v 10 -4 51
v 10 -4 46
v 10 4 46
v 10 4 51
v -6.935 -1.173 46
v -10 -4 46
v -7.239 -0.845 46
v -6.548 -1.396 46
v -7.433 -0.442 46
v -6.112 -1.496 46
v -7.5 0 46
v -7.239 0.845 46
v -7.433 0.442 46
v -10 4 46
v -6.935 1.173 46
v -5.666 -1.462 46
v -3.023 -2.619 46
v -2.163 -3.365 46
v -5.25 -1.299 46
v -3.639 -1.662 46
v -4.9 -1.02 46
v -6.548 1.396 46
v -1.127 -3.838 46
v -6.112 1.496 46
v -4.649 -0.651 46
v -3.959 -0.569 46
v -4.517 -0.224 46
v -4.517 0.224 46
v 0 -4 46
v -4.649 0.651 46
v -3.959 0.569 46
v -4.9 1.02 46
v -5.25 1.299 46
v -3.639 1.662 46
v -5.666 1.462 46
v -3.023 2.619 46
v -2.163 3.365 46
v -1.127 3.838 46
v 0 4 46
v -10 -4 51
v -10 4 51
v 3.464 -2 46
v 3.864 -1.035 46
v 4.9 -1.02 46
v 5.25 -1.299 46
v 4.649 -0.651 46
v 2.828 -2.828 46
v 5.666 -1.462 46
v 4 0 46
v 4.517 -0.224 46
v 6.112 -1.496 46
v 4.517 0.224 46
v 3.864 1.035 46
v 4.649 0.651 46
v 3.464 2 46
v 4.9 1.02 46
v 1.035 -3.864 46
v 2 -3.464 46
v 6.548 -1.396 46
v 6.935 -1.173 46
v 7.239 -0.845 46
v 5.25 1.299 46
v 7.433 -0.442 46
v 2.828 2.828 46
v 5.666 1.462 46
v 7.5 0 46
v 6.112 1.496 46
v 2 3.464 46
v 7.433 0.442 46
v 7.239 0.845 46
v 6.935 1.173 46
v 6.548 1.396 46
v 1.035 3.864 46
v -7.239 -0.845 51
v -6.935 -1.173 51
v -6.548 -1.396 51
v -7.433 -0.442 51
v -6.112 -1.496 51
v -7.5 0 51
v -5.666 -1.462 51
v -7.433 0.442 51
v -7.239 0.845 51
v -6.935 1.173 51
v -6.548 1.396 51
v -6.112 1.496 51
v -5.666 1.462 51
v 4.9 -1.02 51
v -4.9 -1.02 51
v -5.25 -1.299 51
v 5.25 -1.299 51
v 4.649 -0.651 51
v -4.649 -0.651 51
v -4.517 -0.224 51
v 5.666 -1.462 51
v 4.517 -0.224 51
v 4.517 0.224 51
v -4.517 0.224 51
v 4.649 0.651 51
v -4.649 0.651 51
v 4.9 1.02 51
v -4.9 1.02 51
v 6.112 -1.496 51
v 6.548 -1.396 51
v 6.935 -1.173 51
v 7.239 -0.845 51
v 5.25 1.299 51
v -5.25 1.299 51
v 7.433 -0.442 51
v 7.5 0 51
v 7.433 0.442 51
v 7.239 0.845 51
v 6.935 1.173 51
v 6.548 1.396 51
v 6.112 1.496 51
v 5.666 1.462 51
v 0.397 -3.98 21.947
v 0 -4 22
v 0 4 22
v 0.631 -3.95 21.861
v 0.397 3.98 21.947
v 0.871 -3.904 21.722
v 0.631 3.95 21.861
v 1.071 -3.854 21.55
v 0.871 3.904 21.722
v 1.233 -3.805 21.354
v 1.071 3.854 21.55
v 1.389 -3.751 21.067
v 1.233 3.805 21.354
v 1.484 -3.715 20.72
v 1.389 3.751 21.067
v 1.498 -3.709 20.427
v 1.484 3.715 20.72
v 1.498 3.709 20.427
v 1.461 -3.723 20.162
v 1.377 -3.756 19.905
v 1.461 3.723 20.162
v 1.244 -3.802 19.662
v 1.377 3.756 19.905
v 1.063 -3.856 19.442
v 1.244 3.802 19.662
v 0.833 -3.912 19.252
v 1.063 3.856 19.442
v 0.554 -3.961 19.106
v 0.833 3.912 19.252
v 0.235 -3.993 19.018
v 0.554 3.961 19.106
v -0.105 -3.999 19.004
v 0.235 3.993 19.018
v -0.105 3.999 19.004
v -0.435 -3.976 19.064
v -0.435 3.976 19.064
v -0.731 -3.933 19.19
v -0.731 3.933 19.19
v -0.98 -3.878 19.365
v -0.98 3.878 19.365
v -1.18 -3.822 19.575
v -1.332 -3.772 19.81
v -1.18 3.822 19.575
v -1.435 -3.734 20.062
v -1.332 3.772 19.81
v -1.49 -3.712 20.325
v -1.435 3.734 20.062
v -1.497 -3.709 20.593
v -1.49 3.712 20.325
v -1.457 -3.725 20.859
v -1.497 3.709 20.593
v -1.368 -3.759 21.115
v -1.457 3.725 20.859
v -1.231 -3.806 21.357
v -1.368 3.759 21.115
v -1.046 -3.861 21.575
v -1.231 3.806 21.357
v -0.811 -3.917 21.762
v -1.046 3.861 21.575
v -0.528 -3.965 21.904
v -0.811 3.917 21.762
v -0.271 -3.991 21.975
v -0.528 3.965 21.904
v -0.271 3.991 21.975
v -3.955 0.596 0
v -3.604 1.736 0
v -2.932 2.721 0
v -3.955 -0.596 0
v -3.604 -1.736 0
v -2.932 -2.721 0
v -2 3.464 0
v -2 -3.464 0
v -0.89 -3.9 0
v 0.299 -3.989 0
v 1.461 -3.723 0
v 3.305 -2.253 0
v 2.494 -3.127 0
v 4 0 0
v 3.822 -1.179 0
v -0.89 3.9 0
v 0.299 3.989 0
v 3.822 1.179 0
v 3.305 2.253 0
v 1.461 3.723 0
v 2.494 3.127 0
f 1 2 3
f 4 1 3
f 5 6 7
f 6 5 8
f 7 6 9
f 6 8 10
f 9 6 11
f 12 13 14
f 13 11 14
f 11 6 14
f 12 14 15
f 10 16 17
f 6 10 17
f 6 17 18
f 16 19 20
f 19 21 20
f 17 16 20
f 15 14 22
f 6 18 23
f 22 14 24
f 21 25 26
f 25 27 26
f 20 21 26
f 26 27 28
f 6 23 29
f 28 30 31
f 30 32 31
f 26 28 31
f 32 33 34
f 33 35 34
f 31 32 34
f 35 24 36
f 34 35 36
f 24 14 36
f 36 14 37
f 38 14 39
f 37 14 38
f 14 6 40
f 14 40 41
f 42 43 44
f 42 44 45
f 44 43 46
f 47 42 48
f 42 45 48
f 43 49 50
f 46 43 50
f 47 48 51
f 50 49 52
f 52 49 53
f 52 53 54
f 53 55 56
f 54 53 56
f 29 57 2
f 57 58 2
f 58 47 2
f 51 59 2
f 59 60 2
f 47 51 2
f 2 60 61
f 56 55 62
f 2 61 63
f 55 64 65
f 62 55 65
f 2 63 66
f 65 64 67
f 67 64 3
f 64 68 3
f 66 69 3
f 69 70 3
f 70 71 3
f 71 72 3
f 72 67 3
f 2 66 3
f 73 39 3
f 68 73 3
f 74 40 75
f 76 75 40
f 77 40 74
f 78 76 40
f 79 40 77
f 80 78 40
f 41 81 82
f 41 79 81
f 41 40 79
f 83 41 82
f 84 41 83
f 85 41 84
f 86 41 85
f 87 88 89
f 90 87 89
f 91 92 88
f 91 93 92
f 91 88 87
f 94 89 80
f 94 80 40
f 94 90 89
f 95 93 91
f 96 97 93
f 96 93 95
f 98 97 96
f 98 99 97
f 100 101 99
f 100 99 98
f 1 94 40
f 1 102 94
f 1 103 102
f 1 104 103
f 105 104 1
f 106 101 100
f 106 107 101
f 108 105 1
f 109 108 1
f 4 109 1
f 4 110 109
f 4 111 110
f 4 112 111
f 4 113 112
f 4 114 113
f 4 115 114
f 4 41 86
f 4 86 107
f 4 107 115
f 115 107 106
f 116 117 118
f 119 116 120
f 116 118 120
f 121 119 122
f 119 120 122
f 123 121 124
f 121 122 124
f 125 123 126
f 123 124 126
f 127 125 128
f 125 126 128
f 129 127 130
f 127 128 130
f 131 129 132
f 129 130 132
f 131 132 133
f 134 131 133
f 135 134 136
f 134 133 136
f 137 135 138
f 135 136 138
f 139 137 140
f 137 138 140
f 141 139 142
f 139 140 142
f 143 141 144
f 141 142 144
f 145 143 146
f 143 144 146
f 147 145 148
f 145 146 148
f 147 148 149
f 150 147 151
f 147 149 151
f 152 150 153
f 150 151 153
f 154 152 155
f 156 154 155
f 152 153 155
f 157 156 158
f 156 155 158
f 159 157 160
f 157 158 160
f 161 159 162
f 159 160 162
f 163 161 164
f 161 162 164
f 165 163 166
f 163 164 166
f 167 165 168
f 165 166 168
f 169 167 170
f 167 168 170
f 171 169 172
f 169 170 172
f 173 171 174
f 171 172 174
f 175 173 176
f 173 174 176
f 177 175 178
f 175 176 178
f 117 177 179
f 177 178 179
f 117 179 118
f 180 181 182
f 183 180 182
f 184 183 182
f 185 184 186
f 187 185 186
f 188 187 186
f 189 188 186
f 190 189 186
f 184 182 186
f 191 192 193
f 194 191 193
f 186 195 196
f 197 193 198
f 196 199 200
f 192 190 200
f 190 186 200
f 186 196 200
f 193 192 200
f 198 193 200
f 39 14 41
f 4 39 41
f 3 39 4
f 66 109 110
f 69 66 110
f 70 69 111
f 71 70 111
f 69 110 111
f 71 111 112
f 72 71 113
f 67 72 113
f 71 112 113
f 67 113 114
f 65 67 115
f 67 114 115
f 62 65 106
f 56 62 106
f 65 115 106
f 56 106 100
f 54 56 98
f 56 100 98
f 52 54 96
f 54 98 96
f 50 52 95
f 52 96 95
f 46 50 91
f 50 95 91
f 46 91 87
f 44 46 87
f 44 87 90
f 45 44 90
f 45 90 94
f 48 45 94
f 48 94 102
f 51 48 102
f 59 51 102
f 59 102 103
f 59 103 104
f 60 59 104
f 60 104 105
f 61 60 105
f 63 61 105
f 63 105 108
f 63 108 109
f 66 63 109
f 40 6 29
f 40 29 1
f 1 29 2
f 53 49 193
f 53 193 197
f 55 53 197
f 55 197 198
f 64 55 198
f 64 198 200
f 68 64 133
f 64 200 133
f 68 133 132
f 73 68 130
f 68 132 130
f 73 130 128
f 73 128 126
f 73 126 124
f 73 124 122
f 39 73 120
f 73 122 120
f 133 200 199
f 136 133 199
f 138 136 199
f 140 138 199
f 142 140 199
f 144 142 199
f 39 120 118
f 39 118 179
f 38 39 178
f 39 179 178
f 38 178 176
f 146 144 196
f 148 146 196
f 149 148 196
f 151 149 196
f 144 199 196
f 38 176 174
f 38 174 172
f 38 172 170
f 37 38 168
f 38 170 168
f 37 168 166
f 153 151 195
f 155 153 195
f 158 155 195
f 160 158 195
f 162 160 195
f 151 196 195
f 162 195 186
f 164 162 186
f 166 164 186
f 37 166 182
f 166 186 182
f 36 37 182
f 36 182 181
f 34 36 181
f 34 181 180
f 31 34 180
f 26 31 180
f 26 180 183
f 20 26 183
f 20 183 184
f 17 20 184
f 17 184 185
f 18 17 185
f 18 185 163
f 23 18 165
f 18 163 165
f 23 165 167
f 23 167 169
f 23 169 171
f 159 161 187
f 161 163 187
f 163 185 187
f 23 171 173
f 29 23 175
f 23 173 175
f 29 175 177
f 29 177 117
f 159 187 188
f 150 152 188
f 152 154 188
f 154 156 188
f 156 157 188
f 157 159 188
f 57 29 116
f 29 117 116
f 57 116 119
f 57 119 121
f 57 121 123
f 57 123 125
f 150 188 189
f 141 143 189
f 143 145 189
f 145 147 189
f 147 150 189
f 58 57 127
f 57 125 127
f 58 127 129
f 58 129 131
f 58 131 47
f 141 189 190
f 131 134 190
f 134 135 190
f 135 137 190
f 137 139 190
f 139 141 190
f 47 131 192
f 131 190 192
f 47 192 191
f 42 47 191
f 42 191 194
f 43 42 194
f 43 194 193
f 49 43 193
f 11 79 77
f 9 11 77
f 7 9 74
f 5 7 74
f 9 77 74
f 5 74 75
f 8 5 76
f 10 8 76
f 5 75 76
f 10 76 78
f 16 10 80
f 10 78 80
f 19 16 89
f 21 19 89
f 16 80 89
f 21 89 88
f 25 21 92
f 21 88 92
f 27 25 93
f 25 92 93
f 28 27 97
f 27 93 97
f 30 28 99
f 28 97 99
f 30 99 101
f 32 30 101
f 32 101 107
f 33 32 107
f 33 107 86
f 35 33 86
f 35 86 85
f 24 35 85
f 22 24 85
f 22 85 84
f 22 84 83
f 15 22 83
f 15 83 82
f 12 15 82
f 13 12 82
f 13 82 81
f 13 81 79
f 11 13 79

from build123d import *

# Parameters (mm, degrees)
CROQUIS1_R              = 4
SALIENTE_EXTRUIR1_DEPTH = 46
CROQUIS2_W              = 20
CROQUIS2_H              = 8
SALIENTE_EXTRUIR2_DEPTH = 5
CORTAR_EXTRUIR1_REACH   = 54.125
CROQUIS3_R              = 1.5
CROQUIS4_R              = 1.5
CORTAR_EXTRUIR2_DEPTH   = 5


with BuildPart() as part:
    # Croquis1 → Saliente-Extruir1 (new body)
    with BuildSketch(Plane(origin=(0, 0, 0), x_dir=(0, 1, 0), z_dir=(0, 0, 1))):
        with Locations(Location((0, 0, 0), (0, 0, 270))):
            Circle(CROQUIS1_R)
    extrude(amount=SALIENTE_EXTRUIR1_DEPTH)

    # Croquis2 → Saliente-Extruir2 (add)
    with BuildSketch(Plane.XY.offset(46)):
        Rectangle(CROQUIS2_W, CROQUIS2_H)
    extrude(amount=SALIENTE_EXTRUIR2_DEPTH)

    # Croquis3 → Cortar-Extruir1 (cut, up to next)
    with BuildSketch(Plane.XY.offset(51), mode=Mode.PRIVATE) as cortar_extruir1_sk1:
        with Locations((6, 0)):
            Circle(CROQUIS3_R)
    cortar_extruir1_tool1 = extrude(cortar_extruir1_sk1.sketch, amount=-CORTAR_EXTRUIR1_REACH, mode=Mode.PRIVATE) & part.part
    # Croquis3 → Cortar-Extruir1 (cut, up to next)
    with BuildSketch(Plane.XY.offset(51), mode=Mode.PRIVATE) as cortar_extruir1_sk2:
        with Locations(Location((-6, 0, 0), (0, 0, 180))):
            Circle(CROQUIS3_R)
    cortar_extruir1_tool2 = extrude(cortar_extruir1_sk2.sketch, amount=-CORTAR_EXTRUIR1_REACH, mode=Mode.PRIVATE) & part.part
    add(cortar_extruir1_tool1.solids().sort_by_distance((6, 0, 51))[0], mode=Mode.SUBTRACT)
    add(cortar_extruir1_tool2.solids().sort_by_distance((-6, 0, 51))[0], mode=Mode.SUBTRACT)

    # Croquis4 → Cortar-Extruir2 (cut, symmetric)
    with BuildSketch(Plane(origin=(0, 0, 0), x_dir=(-1, 0, 0), z_dir=(0, 1, 0))):
        with Locations(Location((0, 20.5, 0), (0, 0, 90))):
            Circle(CROQUIS4_R)
    extrude(amount=CORTAR_EXTRUIR2_DEPTH, both=True, mode=Mode.SUBTRACT)


solid = part.part
